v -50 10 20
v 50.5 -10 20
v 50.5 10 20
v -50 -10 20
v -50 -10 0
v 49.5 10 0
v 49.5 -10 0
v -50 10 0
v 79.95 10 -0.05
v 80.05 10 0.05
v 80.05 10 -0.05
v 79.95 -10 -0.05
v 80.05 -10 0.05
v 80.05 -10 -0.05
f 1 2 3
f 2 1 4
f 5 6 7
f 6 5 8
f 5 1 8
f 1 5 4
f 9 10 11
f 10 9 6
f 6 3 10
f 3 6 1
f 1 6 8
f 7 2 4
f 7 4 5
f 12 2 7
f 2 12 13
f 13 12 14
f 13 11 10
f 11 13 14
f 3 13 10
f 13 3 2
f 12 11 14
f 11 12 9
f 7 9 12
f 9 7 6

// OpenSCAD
// [FL_INDEX: keywords="openscad, 3d_parametric, Libre_simple_chisel, csg_solid" | COT="Parametric OpenSCAD design from 3DCodeverse"]
// Title: Libre simple chisel

//open source chissel

//Length of chissel handle
L=100; //[0:200]

// Length of tip
t= 30; //[0:100]

//Width of chissel handle
w=20; //[0:50]

//Height of chissel handle
h=20; //[0:20]

// Width of blade
b=20;// [0:50]

// Minimum printing step height
a=0.1; //

translate([0,0,w/2])

union(){
cube([L,h,w], center=true);
hull(){
translate([L/2,0,0])cube([1,h,w], center=true);
rotate([0,0,90])translate([0,-t-L/2,-w/2])cube([b,a,a], center=true);
}
}
